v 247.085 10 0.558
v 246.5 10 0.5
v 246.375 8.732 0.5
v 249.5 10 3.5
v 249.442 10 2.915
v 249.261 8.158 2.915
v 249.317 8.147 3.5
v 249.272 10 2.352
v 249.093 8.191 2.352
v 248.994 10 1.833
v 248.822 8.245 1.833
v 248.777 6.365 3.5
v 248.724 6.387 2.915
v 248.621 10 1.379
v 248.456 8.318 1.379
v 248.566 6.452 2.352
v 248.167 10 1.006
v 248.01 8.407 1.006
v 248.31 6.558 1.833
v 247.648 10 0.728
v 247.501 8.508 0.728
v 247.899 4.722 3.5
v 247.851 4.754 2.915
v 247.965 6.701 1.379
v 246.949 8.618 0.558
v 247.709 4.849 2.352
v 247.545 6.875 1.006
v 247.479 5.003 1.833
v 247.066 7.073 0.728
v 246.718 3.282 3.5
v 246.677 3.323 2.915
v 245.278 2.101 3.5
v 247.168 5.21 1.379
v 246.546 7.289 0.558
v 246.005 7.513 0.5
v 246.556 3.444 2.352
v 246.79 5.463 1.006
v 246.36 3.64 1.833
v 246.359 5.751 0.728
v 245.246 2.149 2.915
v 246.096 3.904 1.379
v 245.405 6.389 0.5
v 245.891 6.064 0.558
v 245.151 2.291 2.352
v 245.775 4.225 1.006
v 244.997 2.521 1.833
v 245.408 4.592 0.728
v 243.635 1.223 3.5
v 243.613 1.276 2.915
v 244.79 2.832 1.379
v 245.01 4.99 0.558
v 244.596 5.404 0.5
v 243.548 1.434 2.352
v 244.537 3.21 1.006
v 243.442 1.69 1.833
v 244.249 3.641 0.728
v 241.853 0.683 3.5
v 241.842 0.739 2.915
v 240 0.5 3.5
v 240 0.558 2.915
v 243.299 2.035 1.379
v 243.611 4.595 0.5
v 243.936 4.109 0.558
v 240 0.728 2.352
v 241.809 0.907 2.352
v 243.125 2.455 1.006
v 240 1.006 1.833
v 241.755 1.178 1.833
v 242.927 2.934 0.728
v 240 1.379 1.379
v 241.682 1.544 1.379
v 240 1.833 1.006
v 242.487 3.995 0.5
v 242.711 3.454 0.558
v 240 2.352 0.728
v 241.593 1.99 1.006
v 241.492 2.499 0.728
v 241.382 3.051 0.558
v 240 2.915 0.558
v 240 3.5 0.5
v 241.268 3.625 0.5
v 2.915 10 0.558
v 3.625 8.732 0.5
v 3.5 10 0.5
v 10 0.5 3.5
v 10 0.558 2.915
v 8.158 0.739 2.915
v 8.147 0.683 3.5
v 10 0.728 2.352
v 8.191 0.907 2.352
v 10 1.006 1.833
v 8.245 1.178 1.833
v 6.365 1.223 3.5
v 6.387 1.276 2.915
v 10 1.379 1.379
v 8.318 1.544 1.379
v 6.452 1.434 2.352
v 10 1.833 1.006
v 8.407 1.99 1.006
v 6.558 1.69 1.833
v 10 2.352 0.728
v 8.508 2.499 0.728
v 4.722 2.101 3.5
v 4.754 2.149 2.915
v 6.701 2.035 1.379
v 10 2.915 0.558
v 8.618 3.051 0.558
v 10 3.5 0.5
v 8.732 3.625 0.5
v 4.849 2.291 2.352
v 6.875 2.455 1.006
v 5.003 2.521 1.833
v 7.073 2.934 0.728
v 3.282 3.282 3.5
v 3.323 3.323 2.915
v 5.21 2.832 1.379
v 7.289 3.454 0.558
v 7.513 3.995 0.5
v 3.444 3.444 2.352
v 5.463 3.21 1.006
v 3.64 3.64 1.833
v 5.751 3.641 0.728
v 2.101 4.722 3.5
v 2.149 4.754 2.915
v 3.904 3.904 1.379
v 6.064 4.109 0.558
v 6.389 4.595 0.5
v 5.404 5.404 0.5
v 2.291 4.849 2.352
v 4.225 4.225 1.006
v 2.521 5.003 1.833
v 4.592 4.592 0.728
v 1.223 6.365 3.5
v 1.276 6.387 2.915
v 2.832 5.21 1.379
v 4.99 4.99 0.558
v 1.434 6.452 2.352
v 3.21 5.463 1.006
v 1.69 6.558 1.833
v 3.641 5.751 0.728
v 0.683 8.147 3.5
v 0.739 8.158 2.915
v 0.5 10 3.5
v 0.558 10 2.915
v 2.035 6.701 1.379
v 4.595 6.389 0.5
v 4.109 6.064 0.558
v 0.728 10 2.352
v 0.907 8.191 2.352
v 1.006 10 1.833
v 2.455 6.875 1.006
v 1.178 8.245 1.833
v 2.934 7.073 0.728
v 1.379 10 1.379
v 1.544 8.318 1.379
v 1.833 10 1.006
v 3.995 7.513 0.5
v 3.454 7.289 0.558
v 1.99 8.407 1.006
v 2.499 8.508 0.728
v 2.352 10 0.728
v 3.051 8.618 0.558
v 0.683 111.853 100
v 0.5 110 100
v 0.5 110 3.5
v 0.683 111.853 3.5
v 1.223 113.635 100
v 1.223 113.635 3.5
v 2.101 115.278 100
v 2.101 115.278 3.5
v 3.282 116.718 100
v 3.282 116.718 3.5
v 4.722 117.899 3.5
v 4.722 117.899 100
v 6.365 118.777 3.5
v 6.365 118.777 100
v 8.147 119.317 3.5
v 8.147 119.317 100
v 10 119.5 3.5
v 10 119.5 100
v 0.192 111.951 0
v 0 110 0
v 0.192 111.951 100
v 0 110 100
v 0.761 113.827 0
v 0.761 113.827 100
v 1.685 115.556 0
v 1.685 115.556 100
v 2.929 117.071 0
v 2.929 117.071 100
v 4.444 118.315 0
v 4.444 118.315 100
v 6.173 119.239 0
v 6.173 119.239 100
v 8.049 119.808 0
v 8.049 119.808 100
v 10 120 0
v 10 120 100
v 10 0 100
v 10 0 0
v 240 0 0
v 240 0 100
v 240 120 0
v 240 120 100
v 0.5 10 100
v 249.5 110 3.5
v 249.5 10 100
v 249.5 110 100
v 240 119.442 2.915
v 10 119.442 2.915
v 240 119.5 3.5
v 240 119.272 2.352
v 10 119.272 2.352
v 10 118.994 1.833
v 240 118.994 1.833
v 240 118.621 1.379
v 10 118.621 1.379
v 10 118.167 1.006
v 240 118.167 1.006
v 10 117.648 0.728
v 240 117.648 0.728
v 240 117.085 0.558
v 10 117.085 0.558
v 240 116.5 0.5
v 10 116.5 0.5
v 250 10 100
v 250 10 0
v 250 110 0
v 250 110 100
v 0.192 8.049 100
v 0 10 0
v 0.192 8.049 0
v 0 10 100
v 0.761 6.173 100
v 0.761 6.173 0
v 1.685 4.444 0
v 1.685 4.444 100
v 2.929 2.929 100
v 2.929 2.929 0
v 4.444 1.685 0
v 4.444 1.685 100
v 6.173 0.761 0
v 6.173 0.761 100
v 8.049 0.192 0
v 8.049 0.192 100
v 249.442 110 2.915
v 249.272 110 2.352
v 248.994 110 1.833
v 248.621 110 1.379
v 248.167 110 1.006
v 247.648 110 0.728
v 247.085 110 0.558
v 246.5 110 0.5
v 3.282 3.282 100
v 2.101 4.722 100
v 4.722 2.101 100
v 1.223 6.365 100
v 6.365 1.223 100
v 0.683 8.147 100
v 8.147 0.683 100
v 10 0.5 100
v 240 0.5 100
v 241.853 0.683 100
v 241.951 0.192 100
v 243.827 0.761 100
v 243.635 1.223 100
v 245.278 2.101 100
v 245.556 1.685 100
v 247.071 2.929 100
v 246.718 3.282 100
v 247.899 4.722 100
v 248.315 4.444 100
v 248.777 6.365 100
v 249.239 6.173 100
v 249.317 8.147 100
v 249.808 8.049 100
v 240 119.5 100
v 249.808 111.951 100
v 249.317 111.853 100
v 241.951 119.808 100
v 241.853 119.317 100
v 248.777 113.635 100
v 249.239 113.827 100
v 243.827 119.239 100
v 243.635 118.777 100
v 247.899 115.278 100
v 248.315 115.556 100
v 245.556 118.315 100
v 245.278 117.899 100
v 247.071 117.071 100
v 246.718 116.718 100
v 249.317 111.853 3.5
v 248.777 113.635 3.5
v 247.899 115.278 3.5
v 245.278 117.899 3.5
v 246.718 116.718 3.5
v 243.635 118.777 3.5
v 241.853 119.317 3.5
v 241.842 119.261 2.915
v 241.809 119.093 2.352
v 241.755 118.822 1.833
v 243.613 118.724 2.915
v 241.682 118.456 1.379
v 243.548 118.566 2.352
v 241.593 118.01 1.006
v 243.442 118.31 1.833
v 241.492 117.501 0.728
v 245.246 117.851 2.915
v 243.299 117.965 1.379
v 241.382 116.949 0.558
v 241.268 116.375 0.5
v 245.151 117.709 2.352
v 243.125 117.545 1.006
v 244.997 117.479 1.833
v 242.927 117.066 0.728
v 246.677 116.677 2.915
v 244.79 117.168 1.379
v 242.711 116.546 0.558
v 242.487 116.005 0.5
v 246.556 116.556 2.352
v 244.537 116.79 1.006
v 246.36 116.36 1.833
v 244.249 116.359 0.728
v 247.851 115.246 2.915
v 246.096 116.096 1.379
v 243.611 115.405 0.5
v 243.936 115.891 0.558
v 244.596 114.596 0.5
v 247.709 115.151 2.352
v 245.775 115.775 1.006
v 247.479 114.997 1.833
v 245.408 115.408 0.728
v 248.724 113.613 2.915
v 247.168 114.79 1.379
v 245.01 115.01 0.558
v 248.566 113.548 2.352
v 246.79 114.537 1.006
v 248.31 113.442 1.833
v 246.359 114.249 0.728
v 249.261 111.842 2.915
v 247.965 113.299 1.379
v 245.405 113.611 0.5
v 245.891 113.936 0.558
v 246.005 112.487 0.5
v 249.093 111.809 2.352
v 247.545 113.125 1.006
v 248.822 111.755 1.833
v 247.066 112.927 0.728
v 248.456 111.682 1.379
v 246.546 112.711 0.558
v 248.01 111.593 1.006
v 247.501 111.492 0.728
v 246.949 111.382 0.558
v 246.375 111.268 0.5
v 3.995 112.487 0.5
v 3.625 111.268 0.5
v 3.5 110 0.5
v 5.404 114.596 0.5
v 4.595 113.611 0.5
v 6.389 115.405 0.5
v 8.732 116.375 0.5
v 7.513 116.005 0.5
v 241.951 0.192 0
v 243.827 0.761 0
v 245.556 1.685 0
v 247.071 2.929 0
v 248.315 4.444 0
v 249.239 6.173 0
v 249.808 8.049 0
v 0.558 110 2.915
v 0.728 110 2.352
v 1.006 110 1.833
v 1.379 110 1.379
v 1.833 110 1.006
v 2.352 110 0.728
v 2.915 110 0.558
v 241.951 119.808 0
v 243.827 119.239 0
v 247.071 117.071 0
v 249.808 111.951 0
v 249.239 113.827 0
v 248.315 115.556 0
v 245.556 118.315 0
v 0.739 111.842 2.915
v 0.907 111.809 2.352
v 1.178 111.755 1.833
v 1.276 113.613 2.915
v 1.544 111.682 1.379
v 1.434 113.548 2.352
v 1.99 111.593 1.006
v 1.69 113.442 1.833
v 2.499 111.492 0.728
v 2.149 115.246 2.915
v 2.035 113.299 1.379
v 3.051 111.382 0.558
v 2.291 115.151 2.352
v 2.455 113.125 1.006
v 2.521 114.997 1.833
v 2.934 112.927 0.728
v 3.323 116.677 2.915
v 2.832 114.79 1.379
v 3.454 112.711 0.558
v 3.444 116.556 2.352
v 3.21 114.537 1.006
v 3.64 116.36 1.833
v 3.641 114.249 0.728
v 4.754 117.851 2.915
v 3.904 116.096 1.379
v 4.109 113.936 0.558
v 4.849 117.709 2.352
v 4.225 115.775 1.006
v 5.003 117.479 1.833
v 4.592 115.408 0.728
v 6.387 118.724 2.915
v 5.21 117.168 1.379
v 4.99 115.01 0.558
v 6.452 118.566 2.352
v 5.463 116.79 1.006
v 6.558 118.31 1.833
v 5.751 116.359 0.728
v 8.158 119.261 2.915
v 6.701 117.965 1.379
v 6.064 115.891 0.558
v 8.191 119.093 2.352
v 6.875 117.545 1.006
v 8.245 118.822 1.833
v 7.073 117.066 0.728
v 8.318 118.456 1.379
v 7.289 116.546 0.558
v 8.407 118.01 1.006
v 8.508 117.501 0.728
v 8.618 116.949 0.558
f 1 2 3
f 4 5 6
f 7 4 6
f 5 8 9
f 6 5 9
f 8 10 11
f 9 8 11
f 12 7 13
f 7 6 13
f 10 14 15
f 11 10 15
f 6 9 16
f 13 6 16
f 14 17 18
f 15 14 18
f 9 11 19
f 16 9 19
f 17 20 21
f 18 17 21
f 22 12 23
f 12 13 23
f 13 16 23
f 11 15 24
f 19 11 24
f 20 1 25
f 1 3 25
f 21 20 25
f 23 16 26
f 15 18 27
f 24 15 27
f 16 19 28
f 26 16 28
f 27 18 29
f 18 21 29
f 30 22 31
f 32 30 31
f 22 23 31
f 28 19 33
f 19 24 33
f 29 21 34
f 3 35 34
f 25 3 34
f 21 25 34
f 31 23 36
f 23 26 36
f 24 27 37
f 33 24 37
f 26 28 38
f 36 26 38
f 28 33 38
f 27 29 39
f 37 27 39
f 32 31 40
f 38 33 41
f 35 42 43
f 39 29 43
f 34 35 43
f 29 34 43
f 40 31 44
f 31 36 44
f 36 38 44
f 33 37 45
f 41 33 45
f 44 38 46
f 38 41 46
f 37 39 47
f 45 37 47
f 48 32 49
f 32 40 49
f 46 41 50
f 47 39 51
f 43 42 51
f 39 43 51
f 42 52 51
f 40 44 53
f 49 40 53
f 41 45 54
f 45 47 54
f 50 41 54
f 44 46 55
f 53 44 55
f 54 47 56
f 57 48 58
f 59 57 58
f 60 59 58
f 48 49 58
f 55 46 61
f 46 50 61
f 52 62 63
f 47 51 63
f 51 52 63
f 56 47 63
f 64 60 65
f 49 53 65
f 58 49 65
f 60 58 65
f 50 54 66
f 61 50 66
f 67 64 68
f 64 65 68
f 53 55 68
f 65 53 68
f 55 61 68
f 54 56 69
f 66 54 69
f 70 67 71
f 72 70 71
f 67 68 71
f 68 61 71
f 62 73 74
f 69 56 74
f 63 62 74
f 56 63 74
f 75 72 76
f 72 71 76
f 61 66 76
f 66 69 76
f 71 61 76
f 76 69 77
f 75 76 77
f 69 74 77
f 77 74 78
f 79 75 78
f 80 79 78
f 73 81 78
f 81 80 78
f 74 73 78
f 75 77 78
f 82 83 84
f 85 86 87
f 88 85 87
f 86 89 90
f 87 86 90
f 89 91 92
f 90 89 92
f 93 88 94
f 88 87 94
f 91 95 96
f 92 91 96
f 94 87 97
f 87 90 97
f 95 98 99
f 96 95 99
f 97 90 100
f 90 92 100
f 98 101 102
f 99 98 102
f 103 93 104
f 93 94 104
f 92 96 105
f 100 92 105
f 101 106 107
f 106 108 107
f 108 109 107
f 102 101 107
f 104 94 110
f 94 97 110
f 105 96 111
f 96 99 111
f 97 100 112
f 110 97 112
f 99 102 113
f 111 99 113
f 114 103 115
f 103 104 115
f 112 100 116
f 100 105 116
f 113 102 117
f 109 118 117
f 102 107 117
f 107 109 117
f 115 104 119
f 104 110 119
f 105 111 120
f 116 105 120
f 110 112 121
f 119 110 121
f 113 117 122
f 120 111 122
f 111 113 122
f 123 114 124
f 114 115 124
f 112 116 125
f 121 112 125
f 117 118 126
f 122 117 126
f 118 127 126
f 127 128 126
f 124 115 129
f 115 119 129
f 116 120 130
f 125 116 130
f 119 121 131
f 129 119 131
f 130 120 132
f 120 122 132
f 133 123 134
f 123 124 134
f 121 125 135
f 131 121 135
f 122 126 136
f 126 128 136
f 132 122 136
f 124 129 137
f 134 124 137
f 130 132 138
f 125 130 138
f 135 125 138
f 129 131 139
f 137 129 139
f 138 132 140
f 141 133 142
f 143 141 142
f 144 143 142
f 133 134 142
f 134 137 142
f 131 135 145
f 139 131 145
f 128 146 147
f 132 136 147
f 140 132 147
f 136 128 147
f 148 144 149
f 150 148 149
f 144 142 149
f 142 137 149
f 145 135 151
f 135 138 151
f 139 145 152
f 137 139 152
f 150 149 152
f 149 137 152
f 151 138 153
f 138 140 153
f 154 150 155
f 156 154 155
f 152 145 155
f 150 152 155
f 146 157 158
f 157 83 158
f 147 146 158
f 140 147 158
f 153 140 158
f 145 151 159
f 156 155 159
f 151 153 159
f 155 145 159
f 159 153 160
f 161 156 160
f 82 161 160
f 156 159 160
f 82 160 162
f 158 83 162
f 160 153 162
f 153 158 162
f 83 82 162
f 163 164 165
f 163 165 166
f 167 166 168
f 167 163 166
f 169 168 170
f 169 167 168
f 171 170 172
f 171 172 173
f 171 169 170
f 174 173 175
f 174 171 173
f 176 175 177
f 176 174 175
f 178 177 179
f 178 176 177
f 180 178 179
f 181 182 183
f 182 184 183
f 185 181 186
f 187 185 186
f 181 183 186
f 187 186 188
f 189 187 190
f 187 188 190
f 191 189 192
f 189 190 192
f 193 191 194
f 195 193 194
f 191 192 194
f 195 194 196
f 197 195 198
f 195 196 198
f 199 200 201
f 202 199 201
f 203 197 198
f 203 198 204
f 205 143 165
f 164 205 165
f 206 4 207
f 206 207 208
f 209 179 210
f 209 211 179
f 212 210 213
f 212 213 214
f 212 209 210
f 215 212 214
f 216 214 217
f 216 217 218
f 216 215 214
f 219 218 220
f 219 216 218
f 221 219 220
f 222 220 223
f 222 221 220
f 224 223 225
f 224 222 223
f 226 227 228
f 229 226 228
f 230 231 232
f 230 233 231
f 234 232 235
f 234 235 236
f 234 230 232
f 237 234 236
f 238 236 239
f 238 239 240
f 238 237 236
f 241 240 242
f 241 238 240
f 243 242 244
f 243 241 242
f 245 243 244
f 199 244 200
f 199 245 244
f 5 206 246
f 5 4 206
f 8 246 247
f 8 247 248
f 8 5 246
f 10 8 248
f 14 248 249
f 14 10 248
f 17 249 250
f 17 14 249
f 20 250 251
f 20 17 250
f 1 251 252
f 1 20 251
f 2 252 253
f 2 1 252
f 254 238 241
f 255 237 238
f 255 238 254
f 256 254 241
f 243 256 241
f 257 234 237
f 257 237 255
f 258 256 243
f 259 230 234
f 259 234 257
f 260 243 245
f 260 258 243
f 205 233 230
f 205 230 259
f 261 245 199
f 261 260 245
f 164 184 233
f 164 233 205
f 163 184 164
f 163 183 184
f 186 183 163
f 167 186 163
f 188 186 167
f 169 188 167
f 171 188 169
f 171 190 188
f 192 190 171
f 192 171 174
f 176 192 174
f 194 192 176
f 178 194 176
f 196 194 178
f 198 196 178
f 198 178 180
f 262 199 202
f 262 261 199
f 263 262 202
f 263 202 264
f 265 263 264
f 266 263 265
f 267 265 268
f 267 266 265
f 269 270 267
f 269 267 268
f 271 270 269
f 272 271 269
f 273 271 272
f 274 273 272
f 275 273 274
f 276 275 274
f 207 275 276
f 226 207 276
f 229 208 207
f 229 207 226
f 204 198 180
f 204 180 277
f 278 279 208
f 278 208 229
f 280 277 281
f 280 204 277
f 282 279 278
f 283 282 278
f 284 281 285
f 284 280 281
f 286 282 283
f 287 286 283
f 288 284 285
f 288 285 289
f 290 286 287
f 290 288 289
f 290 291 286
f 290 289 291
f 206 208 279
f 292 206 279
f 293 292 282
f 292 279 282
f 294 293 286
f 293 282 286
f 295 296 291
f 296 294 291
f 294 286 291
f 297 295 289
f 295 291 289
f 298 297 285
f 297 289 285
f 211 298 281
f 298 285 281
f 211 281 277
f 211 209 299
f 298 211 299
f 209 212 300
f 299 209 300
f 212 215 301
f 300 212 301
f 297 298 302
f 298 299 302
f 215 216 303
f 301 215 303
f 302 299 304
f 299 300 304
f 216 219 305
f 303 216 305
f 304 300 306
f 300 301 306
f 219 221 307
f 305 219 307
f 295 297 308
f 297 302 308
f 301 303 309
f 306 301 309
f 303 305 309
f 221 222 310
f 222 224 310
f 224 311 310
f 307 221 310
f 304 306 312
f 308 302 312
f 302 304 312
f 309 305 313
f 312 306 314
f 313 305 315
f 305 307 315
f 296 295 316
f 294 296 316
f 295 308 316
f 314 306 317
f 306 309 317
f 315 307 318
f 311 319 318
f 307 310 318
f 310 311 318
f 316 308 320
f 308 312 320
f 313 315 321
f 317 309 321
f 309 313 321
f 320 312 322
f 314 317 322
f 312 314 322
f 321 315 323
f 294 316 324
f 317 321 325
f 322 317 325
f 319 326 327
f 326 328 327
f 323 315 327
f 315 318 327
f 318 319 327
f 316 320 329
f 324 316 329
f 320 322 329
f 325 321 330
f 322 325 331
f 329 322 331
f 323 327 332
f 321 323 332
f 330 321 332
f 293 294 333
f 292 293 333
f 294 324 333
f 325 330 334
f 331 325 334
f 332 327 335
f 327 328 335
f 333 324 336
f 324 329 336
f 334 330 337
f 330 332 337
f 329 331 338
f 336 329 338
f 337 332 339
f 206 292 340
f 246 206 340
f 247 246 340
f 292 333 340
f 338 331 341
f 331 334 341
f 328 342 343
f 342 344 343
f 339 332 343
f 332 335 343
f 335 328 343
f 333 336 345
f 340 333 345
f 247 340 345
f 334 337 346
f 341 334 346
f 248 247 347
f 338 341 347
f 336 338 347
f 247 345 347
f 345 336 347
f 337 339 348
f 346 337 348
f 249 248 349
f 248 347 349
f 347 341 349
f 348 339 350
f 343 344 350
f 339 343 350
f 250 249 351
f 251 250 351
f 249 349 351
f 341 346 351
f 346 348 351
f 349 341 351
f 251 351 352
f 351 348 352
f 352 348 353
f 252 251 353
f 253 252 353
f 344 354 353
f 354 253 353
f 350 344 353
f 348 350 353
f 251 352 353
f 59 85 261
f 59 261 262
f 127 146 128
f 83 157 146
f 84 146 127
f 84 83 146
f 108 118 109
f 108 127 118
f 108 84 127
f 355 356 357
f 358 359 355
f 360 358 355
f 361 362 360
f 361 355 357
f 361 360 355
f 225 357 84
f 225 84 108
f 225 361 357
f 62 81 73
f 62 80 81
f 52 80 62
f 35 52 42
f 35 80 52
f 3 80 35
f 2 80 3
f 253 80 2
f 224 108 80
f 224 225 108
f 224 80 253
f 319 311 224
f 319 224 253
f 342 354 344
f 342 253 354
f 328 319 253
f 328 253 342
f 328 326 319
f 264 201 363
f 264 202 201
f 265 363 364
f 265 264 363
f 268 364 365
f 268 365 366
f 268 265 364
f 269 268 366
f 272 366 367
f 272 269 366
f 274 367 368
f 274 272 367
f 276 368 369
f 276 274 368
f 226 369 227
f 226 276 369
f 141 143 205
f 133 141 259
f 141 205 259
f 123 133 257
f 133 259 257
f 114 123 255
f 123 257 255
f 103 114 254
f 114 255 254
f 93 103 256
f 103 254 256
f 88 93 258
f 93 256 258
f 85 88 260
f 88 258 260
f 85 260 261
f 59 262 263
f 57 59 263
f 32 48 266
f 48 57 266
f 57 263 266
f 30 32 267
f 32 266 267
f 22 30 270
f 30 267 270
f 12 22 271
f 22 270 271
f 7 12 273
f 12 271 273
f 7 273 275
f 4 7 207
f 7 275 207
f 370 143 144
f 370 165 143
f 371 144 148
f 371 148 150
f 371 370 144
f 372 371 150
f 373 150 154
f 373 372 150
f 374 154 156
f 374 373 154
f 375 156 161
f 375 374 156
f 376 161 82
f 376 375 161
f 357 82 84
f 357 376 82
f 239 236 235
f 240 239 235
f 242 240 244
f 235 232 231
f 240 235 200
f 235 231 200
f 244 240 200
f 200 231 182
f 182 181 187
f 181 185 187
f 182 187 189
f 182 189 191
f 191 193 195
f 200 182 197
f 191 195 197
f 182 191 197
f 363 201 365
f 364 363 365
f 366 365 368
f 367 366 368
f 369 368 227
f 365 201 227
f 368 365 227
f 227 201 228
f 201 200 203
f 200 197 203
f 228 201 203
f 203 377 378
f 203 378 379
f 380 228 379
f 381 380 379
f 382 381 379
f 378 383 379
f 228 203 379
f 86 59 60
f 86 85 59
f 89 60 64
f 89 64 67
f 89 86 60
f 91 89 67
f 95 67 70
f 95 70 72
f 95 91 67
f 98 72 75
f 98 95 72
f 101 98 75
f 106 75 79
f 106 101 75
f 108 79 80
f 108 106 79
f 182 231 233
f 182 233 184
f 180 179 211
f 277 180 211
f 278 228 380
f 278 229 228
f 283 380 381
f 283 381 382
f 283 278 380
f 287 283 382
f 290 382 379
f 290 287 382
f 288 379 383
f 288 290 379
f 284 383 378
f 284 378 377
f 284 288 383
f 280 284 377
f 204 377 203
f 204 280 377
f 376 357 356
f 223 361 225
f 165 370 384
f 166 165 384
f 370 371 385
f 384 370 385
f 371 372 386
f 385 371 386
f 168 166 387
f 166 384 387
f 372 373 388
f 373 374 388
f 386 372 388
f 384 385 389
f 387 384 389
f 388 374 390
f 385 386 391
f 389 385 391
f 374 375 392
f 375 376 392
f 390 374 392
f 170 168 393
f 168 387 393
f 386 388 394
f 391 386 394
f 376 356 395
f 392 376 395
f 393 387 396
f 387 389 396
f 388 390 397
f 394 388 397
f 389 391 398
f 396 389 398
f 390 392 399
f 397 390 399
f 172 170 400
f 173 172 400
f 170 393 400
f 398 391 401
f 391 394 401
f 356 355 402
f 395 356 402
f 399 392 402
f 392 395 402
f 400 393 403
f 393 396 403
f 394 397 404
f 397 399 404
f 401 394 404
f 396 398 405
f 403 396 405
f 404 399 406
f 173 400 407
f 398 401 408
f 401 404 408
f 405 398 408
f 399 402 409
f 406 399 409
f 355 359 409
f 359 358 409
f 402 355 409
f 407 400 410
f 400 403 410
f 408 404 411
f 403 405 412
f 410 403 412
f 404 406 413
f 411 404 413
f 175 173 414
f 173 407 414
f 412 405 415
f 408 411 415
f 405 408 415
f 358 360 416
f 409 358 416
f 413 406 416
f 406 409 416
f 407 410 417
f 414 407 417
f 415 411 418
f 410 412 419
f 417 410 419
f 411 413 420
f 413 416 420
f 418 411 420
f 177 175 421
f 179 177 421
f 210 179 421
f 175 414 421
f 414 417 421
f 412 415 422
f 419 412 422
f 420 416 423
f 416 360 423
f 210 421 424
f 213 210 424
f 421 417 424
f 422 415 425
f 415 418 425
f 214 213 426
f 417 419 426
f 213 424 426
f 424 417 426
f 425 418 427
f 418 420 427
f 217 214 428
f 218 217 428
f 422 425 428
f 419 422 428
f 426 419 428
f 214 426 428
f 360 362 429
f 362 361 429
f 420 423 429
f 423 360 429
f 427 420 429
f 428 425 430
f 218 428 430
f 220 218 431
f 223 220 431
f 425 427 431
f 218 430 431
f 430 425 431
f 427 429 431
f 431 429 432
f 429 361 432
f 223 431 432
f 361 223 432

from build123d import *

# Parameters (mm, degrees)
F0_W     = 250
F0_H     = 120
F1_DEPTH = 100
F2_R     = 10
F3_T     = -0.5
F4_R     = 3


with BuildPart() as f1:
    # F0 (on Top) → F1 (new body)
    with BuildSketch(Plane.XY):
        with Locations((125, 60)):
            Rectangle(F0_W, F0_H)
    extrude(amount=F1_DEPTH)

    # F2
    f2_edges = [f1.edges().sort_by_distance(p)[0] for p in [
        (0, 0, 50),
        (250, 0, 50),
        (250, 120, 50),
        (0, 120, 50),
    ]]
    fillet(f2_edges, radius=F2_R)

    # F3
    f3_openings = [f1.faces().sort_by_distance(p)[0] for p in [
        (125, 60, 100),
    ]]
    offset(amount=F3_T, openings=f3_openings)

    # F4
    f4_edges = [f1.edges().sort_by_distance(p)[0] for p in [
        (0.5, 60, 0.5),
        (3.282486, 3.282486, 0.5),
        (125, 0.5, 0.5),
        (246.717514, 3.282486, 0.5),
        (249.5, 60, 0.5),
        (246.717514, 116.717514, 0.5),
        (125, 119.5, 0.5),
        (3.282486, 116.717514, 0.5),
    ]]
    fillet(f4_edges, radius=F4_R)


solid = f1.part
